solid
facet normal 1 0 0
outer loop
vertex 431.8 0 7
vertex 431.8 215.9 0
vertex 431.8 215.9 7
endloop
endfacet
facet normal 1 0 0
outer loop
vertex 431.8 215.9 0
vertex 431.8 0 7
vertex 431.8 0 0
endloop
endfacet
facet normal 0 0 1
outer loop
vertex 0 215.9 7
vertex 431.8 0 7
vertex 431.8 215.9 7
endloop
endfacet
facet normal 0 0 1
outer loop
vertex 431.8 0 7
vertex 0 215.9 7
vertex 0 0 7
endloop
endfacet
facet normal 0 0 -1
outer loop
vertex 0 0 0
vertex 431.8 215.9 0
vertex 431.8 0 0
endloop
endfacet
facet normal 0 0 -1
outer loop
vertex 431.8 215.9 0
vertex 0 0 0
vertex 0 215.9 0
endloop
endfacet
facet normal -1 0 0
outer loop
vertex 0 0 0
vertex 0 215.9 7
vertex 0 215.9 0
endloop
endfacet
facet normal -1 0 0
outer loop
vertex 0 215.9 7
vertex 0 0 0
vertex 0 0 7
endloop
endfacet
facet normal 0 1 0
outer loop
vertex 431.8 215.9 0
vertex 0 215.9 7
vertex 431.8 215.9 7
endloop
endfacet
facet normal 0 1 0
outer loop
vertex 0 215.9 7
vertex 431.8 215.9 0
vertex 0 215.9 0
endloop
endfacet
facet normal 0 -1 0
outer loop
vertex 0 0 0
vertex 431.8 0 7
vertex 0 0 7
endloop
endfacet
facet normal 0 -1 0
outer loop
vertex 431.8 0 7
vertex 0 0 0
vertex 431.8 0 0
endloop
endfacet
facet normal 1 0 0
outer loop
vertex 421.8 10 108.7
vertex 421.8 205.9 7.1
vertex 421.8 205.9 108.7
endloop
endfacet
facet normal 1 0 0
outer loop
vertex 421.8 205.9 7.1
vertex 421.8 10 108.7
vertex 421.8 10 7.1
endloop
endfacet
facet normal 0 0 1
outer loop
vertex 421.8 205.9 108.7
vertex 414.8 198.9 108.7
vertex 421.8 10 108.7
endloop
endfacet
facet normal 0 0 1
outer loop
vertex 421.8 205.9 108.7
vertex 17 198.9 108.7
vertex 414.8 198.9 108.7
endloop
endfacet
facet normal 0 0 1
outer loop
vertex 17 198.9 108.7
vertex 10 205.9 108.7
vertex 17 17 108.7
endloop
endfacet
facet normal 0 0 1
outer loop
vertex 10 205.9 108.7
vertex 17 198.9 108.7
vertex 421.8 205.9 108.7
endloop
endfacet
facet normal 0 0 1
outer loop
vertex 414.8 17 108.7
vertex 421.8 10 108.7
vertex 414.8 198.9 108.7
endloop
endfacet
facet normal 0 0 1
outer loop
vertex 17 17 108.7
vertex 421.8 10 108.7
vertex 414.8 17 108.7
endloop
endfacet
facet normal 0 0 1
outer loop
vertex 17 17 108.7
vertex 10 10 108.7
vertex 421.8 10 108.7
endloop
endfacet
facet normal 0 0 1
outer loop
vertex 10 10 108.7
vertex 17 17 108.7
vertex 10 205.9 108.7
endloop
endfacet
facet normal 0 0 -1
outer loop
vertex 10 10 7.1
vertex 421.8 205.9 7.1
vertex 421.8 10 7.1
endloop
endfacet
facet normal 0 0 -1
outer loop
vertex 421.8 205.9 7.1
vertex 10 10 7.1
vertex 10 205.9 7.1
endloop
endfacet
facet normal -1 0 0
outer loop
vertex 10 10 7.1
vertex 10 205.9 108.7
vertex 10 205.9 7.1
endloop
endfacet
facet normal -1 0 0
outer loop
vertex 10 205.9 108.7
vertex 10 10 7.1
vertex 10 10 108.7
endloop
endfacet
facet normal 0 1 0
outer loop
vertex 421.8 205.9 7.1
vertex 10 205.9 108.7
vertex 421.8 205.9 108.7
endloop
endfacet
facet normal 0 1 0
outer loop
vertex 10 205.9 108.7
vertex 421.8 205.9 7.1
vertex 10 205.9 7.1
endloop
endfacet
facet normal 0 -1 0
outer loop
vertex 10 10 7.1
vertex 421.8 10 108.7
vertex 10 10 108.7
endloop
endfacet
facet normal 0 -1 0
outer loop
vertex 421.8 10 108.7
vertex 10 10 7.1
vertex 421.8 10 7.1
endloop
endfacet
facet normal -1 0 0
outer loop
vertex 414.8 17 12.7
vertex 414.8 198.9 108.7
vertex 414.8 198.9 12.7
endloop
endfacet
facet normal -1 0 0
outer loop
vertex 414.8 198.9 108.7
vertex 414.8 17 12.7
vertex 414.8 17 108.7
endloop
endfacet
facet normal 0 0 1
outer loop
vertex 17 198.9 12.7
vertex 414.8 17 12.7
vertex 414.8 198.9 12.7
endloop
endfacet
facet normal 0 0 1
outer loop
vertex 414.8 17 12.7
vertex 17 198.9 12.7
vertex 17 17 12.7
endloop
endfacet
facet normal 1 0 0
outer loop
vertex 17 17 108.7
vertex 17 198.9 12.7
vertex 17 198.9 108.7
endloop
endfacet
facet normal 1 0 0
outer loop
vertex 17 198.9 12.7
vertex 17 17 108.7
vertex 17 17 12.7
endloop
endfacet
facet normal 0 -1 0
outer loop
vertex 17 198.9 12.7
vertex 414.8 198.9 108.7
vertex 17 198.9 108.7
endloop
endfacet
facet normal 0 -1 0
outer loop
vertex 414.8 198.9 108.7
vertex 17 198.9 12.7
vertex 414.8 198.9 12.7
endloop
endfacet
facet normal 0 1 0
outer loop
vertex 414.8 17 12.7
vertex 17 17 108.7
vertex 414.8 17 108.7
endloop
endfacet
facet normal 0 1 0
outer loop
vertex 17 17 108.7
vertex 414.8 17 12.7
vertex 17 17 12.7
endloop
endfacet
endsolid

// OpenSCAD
overall_width=8.5*25.4;
overall_height=13*25.4;
overall_length=17*25.4;

lid();

//bottom
//frame(x=overall_length, y=overall_width);

//sides x2
//translate([0,overall_width,0])
//rotate([90,0,0])
//frame(x=overall_length, y=overall_height);
//rotate([90,0,0])
//frame(x=overall_length, y=overall_height);

/*
//sides narrow x2
rotate([90,0,90])
frame(x=overall_width, y=overall_height);
translate([overall_length-3,0,0])
rotate([90,0,90])
frame(x=overall_width, y=overall_height);
*/

module frame(num_slots=6, thickness = 2, layers=2, spacing = 5, rim = 4, x = 0, y = 0){
    difference(){
    cube([x,y,layers]);
        num_rows = floor((y-(rim*3))/(spacing+thickness));
        for(i = [0:num_rows]){
            for(j=[0:num_slots]){
                grid_length = (x - (2*rim) ) / (num_slots+1) ;
                translate([rim+(j*(grid_length)),
                (i*(spacing+thickness))+(rim),-.2])
                cube([grid_length-thickness,spacing,layers+.4]);
            }
        }
    }
}

module lid(){
    difference(){
        union(){
            cube([overall_length,overall_width, 7]);
            translate([10,10,7.1])
            color("red")
            cube([overall_length-20,overall_width-20, 4*25.4]);
        }

            translate([17,17,12.7])
            color("blue")
            cube([overall_length-34,overall_width-34, 4*25.4]);
    }
}

/*
difference(){
    cube([length,width, height]);
    translate([spacing,spacing,spacing])
    cube([length-(2*spacing),width-(2*spacing), height]);
    
    
color("red")
for(i = [0:25]){
    for(j=[0:6]){
        translate([8+(j*(grid_length*25.4+5)),i*(spacing+5)+5,-.2])
        cube([grid_length*25.4,spacing,spacing+.4]);
    }
}


color("green")
for(i = [0:3]){
    for(j=[0:45]){
        translate([-.1, i*(grid_length*25.4+5)+20,8+(j*(spacing+5))])
        cube([spacing+.2,grid_length*25.4, spacing]);
    }
}

color("cyan")
for(i = [0:3]){
    for(j=[0:45]){
        translate([length+-.1-spacing, i*(grid_length*25.4+5)+20,8+(j*(spacing+5))])
        cube([spacing+.2,grid_length*25.4, spacing]);
    }
}


color("purple")
for(i = [0:6]){
    for(j=[0:45]){
        
        translate([i*(grid_length*25.4+5)+10,-.1,8+(j*(spacing+5))])
        cube([grid_length*25.4,spacing+.2,spacing]);
    }
}

color("blue")
for(i = [0:6]){
    for(j=[0:45]){
        translate([i*(grid_length*25.4+5)+10,-.1+width-spacing,8+(j*(spacing+5))])
        cube([grid_length*25.4,spacing+.2,spacing]);
    }
}

}
*/
